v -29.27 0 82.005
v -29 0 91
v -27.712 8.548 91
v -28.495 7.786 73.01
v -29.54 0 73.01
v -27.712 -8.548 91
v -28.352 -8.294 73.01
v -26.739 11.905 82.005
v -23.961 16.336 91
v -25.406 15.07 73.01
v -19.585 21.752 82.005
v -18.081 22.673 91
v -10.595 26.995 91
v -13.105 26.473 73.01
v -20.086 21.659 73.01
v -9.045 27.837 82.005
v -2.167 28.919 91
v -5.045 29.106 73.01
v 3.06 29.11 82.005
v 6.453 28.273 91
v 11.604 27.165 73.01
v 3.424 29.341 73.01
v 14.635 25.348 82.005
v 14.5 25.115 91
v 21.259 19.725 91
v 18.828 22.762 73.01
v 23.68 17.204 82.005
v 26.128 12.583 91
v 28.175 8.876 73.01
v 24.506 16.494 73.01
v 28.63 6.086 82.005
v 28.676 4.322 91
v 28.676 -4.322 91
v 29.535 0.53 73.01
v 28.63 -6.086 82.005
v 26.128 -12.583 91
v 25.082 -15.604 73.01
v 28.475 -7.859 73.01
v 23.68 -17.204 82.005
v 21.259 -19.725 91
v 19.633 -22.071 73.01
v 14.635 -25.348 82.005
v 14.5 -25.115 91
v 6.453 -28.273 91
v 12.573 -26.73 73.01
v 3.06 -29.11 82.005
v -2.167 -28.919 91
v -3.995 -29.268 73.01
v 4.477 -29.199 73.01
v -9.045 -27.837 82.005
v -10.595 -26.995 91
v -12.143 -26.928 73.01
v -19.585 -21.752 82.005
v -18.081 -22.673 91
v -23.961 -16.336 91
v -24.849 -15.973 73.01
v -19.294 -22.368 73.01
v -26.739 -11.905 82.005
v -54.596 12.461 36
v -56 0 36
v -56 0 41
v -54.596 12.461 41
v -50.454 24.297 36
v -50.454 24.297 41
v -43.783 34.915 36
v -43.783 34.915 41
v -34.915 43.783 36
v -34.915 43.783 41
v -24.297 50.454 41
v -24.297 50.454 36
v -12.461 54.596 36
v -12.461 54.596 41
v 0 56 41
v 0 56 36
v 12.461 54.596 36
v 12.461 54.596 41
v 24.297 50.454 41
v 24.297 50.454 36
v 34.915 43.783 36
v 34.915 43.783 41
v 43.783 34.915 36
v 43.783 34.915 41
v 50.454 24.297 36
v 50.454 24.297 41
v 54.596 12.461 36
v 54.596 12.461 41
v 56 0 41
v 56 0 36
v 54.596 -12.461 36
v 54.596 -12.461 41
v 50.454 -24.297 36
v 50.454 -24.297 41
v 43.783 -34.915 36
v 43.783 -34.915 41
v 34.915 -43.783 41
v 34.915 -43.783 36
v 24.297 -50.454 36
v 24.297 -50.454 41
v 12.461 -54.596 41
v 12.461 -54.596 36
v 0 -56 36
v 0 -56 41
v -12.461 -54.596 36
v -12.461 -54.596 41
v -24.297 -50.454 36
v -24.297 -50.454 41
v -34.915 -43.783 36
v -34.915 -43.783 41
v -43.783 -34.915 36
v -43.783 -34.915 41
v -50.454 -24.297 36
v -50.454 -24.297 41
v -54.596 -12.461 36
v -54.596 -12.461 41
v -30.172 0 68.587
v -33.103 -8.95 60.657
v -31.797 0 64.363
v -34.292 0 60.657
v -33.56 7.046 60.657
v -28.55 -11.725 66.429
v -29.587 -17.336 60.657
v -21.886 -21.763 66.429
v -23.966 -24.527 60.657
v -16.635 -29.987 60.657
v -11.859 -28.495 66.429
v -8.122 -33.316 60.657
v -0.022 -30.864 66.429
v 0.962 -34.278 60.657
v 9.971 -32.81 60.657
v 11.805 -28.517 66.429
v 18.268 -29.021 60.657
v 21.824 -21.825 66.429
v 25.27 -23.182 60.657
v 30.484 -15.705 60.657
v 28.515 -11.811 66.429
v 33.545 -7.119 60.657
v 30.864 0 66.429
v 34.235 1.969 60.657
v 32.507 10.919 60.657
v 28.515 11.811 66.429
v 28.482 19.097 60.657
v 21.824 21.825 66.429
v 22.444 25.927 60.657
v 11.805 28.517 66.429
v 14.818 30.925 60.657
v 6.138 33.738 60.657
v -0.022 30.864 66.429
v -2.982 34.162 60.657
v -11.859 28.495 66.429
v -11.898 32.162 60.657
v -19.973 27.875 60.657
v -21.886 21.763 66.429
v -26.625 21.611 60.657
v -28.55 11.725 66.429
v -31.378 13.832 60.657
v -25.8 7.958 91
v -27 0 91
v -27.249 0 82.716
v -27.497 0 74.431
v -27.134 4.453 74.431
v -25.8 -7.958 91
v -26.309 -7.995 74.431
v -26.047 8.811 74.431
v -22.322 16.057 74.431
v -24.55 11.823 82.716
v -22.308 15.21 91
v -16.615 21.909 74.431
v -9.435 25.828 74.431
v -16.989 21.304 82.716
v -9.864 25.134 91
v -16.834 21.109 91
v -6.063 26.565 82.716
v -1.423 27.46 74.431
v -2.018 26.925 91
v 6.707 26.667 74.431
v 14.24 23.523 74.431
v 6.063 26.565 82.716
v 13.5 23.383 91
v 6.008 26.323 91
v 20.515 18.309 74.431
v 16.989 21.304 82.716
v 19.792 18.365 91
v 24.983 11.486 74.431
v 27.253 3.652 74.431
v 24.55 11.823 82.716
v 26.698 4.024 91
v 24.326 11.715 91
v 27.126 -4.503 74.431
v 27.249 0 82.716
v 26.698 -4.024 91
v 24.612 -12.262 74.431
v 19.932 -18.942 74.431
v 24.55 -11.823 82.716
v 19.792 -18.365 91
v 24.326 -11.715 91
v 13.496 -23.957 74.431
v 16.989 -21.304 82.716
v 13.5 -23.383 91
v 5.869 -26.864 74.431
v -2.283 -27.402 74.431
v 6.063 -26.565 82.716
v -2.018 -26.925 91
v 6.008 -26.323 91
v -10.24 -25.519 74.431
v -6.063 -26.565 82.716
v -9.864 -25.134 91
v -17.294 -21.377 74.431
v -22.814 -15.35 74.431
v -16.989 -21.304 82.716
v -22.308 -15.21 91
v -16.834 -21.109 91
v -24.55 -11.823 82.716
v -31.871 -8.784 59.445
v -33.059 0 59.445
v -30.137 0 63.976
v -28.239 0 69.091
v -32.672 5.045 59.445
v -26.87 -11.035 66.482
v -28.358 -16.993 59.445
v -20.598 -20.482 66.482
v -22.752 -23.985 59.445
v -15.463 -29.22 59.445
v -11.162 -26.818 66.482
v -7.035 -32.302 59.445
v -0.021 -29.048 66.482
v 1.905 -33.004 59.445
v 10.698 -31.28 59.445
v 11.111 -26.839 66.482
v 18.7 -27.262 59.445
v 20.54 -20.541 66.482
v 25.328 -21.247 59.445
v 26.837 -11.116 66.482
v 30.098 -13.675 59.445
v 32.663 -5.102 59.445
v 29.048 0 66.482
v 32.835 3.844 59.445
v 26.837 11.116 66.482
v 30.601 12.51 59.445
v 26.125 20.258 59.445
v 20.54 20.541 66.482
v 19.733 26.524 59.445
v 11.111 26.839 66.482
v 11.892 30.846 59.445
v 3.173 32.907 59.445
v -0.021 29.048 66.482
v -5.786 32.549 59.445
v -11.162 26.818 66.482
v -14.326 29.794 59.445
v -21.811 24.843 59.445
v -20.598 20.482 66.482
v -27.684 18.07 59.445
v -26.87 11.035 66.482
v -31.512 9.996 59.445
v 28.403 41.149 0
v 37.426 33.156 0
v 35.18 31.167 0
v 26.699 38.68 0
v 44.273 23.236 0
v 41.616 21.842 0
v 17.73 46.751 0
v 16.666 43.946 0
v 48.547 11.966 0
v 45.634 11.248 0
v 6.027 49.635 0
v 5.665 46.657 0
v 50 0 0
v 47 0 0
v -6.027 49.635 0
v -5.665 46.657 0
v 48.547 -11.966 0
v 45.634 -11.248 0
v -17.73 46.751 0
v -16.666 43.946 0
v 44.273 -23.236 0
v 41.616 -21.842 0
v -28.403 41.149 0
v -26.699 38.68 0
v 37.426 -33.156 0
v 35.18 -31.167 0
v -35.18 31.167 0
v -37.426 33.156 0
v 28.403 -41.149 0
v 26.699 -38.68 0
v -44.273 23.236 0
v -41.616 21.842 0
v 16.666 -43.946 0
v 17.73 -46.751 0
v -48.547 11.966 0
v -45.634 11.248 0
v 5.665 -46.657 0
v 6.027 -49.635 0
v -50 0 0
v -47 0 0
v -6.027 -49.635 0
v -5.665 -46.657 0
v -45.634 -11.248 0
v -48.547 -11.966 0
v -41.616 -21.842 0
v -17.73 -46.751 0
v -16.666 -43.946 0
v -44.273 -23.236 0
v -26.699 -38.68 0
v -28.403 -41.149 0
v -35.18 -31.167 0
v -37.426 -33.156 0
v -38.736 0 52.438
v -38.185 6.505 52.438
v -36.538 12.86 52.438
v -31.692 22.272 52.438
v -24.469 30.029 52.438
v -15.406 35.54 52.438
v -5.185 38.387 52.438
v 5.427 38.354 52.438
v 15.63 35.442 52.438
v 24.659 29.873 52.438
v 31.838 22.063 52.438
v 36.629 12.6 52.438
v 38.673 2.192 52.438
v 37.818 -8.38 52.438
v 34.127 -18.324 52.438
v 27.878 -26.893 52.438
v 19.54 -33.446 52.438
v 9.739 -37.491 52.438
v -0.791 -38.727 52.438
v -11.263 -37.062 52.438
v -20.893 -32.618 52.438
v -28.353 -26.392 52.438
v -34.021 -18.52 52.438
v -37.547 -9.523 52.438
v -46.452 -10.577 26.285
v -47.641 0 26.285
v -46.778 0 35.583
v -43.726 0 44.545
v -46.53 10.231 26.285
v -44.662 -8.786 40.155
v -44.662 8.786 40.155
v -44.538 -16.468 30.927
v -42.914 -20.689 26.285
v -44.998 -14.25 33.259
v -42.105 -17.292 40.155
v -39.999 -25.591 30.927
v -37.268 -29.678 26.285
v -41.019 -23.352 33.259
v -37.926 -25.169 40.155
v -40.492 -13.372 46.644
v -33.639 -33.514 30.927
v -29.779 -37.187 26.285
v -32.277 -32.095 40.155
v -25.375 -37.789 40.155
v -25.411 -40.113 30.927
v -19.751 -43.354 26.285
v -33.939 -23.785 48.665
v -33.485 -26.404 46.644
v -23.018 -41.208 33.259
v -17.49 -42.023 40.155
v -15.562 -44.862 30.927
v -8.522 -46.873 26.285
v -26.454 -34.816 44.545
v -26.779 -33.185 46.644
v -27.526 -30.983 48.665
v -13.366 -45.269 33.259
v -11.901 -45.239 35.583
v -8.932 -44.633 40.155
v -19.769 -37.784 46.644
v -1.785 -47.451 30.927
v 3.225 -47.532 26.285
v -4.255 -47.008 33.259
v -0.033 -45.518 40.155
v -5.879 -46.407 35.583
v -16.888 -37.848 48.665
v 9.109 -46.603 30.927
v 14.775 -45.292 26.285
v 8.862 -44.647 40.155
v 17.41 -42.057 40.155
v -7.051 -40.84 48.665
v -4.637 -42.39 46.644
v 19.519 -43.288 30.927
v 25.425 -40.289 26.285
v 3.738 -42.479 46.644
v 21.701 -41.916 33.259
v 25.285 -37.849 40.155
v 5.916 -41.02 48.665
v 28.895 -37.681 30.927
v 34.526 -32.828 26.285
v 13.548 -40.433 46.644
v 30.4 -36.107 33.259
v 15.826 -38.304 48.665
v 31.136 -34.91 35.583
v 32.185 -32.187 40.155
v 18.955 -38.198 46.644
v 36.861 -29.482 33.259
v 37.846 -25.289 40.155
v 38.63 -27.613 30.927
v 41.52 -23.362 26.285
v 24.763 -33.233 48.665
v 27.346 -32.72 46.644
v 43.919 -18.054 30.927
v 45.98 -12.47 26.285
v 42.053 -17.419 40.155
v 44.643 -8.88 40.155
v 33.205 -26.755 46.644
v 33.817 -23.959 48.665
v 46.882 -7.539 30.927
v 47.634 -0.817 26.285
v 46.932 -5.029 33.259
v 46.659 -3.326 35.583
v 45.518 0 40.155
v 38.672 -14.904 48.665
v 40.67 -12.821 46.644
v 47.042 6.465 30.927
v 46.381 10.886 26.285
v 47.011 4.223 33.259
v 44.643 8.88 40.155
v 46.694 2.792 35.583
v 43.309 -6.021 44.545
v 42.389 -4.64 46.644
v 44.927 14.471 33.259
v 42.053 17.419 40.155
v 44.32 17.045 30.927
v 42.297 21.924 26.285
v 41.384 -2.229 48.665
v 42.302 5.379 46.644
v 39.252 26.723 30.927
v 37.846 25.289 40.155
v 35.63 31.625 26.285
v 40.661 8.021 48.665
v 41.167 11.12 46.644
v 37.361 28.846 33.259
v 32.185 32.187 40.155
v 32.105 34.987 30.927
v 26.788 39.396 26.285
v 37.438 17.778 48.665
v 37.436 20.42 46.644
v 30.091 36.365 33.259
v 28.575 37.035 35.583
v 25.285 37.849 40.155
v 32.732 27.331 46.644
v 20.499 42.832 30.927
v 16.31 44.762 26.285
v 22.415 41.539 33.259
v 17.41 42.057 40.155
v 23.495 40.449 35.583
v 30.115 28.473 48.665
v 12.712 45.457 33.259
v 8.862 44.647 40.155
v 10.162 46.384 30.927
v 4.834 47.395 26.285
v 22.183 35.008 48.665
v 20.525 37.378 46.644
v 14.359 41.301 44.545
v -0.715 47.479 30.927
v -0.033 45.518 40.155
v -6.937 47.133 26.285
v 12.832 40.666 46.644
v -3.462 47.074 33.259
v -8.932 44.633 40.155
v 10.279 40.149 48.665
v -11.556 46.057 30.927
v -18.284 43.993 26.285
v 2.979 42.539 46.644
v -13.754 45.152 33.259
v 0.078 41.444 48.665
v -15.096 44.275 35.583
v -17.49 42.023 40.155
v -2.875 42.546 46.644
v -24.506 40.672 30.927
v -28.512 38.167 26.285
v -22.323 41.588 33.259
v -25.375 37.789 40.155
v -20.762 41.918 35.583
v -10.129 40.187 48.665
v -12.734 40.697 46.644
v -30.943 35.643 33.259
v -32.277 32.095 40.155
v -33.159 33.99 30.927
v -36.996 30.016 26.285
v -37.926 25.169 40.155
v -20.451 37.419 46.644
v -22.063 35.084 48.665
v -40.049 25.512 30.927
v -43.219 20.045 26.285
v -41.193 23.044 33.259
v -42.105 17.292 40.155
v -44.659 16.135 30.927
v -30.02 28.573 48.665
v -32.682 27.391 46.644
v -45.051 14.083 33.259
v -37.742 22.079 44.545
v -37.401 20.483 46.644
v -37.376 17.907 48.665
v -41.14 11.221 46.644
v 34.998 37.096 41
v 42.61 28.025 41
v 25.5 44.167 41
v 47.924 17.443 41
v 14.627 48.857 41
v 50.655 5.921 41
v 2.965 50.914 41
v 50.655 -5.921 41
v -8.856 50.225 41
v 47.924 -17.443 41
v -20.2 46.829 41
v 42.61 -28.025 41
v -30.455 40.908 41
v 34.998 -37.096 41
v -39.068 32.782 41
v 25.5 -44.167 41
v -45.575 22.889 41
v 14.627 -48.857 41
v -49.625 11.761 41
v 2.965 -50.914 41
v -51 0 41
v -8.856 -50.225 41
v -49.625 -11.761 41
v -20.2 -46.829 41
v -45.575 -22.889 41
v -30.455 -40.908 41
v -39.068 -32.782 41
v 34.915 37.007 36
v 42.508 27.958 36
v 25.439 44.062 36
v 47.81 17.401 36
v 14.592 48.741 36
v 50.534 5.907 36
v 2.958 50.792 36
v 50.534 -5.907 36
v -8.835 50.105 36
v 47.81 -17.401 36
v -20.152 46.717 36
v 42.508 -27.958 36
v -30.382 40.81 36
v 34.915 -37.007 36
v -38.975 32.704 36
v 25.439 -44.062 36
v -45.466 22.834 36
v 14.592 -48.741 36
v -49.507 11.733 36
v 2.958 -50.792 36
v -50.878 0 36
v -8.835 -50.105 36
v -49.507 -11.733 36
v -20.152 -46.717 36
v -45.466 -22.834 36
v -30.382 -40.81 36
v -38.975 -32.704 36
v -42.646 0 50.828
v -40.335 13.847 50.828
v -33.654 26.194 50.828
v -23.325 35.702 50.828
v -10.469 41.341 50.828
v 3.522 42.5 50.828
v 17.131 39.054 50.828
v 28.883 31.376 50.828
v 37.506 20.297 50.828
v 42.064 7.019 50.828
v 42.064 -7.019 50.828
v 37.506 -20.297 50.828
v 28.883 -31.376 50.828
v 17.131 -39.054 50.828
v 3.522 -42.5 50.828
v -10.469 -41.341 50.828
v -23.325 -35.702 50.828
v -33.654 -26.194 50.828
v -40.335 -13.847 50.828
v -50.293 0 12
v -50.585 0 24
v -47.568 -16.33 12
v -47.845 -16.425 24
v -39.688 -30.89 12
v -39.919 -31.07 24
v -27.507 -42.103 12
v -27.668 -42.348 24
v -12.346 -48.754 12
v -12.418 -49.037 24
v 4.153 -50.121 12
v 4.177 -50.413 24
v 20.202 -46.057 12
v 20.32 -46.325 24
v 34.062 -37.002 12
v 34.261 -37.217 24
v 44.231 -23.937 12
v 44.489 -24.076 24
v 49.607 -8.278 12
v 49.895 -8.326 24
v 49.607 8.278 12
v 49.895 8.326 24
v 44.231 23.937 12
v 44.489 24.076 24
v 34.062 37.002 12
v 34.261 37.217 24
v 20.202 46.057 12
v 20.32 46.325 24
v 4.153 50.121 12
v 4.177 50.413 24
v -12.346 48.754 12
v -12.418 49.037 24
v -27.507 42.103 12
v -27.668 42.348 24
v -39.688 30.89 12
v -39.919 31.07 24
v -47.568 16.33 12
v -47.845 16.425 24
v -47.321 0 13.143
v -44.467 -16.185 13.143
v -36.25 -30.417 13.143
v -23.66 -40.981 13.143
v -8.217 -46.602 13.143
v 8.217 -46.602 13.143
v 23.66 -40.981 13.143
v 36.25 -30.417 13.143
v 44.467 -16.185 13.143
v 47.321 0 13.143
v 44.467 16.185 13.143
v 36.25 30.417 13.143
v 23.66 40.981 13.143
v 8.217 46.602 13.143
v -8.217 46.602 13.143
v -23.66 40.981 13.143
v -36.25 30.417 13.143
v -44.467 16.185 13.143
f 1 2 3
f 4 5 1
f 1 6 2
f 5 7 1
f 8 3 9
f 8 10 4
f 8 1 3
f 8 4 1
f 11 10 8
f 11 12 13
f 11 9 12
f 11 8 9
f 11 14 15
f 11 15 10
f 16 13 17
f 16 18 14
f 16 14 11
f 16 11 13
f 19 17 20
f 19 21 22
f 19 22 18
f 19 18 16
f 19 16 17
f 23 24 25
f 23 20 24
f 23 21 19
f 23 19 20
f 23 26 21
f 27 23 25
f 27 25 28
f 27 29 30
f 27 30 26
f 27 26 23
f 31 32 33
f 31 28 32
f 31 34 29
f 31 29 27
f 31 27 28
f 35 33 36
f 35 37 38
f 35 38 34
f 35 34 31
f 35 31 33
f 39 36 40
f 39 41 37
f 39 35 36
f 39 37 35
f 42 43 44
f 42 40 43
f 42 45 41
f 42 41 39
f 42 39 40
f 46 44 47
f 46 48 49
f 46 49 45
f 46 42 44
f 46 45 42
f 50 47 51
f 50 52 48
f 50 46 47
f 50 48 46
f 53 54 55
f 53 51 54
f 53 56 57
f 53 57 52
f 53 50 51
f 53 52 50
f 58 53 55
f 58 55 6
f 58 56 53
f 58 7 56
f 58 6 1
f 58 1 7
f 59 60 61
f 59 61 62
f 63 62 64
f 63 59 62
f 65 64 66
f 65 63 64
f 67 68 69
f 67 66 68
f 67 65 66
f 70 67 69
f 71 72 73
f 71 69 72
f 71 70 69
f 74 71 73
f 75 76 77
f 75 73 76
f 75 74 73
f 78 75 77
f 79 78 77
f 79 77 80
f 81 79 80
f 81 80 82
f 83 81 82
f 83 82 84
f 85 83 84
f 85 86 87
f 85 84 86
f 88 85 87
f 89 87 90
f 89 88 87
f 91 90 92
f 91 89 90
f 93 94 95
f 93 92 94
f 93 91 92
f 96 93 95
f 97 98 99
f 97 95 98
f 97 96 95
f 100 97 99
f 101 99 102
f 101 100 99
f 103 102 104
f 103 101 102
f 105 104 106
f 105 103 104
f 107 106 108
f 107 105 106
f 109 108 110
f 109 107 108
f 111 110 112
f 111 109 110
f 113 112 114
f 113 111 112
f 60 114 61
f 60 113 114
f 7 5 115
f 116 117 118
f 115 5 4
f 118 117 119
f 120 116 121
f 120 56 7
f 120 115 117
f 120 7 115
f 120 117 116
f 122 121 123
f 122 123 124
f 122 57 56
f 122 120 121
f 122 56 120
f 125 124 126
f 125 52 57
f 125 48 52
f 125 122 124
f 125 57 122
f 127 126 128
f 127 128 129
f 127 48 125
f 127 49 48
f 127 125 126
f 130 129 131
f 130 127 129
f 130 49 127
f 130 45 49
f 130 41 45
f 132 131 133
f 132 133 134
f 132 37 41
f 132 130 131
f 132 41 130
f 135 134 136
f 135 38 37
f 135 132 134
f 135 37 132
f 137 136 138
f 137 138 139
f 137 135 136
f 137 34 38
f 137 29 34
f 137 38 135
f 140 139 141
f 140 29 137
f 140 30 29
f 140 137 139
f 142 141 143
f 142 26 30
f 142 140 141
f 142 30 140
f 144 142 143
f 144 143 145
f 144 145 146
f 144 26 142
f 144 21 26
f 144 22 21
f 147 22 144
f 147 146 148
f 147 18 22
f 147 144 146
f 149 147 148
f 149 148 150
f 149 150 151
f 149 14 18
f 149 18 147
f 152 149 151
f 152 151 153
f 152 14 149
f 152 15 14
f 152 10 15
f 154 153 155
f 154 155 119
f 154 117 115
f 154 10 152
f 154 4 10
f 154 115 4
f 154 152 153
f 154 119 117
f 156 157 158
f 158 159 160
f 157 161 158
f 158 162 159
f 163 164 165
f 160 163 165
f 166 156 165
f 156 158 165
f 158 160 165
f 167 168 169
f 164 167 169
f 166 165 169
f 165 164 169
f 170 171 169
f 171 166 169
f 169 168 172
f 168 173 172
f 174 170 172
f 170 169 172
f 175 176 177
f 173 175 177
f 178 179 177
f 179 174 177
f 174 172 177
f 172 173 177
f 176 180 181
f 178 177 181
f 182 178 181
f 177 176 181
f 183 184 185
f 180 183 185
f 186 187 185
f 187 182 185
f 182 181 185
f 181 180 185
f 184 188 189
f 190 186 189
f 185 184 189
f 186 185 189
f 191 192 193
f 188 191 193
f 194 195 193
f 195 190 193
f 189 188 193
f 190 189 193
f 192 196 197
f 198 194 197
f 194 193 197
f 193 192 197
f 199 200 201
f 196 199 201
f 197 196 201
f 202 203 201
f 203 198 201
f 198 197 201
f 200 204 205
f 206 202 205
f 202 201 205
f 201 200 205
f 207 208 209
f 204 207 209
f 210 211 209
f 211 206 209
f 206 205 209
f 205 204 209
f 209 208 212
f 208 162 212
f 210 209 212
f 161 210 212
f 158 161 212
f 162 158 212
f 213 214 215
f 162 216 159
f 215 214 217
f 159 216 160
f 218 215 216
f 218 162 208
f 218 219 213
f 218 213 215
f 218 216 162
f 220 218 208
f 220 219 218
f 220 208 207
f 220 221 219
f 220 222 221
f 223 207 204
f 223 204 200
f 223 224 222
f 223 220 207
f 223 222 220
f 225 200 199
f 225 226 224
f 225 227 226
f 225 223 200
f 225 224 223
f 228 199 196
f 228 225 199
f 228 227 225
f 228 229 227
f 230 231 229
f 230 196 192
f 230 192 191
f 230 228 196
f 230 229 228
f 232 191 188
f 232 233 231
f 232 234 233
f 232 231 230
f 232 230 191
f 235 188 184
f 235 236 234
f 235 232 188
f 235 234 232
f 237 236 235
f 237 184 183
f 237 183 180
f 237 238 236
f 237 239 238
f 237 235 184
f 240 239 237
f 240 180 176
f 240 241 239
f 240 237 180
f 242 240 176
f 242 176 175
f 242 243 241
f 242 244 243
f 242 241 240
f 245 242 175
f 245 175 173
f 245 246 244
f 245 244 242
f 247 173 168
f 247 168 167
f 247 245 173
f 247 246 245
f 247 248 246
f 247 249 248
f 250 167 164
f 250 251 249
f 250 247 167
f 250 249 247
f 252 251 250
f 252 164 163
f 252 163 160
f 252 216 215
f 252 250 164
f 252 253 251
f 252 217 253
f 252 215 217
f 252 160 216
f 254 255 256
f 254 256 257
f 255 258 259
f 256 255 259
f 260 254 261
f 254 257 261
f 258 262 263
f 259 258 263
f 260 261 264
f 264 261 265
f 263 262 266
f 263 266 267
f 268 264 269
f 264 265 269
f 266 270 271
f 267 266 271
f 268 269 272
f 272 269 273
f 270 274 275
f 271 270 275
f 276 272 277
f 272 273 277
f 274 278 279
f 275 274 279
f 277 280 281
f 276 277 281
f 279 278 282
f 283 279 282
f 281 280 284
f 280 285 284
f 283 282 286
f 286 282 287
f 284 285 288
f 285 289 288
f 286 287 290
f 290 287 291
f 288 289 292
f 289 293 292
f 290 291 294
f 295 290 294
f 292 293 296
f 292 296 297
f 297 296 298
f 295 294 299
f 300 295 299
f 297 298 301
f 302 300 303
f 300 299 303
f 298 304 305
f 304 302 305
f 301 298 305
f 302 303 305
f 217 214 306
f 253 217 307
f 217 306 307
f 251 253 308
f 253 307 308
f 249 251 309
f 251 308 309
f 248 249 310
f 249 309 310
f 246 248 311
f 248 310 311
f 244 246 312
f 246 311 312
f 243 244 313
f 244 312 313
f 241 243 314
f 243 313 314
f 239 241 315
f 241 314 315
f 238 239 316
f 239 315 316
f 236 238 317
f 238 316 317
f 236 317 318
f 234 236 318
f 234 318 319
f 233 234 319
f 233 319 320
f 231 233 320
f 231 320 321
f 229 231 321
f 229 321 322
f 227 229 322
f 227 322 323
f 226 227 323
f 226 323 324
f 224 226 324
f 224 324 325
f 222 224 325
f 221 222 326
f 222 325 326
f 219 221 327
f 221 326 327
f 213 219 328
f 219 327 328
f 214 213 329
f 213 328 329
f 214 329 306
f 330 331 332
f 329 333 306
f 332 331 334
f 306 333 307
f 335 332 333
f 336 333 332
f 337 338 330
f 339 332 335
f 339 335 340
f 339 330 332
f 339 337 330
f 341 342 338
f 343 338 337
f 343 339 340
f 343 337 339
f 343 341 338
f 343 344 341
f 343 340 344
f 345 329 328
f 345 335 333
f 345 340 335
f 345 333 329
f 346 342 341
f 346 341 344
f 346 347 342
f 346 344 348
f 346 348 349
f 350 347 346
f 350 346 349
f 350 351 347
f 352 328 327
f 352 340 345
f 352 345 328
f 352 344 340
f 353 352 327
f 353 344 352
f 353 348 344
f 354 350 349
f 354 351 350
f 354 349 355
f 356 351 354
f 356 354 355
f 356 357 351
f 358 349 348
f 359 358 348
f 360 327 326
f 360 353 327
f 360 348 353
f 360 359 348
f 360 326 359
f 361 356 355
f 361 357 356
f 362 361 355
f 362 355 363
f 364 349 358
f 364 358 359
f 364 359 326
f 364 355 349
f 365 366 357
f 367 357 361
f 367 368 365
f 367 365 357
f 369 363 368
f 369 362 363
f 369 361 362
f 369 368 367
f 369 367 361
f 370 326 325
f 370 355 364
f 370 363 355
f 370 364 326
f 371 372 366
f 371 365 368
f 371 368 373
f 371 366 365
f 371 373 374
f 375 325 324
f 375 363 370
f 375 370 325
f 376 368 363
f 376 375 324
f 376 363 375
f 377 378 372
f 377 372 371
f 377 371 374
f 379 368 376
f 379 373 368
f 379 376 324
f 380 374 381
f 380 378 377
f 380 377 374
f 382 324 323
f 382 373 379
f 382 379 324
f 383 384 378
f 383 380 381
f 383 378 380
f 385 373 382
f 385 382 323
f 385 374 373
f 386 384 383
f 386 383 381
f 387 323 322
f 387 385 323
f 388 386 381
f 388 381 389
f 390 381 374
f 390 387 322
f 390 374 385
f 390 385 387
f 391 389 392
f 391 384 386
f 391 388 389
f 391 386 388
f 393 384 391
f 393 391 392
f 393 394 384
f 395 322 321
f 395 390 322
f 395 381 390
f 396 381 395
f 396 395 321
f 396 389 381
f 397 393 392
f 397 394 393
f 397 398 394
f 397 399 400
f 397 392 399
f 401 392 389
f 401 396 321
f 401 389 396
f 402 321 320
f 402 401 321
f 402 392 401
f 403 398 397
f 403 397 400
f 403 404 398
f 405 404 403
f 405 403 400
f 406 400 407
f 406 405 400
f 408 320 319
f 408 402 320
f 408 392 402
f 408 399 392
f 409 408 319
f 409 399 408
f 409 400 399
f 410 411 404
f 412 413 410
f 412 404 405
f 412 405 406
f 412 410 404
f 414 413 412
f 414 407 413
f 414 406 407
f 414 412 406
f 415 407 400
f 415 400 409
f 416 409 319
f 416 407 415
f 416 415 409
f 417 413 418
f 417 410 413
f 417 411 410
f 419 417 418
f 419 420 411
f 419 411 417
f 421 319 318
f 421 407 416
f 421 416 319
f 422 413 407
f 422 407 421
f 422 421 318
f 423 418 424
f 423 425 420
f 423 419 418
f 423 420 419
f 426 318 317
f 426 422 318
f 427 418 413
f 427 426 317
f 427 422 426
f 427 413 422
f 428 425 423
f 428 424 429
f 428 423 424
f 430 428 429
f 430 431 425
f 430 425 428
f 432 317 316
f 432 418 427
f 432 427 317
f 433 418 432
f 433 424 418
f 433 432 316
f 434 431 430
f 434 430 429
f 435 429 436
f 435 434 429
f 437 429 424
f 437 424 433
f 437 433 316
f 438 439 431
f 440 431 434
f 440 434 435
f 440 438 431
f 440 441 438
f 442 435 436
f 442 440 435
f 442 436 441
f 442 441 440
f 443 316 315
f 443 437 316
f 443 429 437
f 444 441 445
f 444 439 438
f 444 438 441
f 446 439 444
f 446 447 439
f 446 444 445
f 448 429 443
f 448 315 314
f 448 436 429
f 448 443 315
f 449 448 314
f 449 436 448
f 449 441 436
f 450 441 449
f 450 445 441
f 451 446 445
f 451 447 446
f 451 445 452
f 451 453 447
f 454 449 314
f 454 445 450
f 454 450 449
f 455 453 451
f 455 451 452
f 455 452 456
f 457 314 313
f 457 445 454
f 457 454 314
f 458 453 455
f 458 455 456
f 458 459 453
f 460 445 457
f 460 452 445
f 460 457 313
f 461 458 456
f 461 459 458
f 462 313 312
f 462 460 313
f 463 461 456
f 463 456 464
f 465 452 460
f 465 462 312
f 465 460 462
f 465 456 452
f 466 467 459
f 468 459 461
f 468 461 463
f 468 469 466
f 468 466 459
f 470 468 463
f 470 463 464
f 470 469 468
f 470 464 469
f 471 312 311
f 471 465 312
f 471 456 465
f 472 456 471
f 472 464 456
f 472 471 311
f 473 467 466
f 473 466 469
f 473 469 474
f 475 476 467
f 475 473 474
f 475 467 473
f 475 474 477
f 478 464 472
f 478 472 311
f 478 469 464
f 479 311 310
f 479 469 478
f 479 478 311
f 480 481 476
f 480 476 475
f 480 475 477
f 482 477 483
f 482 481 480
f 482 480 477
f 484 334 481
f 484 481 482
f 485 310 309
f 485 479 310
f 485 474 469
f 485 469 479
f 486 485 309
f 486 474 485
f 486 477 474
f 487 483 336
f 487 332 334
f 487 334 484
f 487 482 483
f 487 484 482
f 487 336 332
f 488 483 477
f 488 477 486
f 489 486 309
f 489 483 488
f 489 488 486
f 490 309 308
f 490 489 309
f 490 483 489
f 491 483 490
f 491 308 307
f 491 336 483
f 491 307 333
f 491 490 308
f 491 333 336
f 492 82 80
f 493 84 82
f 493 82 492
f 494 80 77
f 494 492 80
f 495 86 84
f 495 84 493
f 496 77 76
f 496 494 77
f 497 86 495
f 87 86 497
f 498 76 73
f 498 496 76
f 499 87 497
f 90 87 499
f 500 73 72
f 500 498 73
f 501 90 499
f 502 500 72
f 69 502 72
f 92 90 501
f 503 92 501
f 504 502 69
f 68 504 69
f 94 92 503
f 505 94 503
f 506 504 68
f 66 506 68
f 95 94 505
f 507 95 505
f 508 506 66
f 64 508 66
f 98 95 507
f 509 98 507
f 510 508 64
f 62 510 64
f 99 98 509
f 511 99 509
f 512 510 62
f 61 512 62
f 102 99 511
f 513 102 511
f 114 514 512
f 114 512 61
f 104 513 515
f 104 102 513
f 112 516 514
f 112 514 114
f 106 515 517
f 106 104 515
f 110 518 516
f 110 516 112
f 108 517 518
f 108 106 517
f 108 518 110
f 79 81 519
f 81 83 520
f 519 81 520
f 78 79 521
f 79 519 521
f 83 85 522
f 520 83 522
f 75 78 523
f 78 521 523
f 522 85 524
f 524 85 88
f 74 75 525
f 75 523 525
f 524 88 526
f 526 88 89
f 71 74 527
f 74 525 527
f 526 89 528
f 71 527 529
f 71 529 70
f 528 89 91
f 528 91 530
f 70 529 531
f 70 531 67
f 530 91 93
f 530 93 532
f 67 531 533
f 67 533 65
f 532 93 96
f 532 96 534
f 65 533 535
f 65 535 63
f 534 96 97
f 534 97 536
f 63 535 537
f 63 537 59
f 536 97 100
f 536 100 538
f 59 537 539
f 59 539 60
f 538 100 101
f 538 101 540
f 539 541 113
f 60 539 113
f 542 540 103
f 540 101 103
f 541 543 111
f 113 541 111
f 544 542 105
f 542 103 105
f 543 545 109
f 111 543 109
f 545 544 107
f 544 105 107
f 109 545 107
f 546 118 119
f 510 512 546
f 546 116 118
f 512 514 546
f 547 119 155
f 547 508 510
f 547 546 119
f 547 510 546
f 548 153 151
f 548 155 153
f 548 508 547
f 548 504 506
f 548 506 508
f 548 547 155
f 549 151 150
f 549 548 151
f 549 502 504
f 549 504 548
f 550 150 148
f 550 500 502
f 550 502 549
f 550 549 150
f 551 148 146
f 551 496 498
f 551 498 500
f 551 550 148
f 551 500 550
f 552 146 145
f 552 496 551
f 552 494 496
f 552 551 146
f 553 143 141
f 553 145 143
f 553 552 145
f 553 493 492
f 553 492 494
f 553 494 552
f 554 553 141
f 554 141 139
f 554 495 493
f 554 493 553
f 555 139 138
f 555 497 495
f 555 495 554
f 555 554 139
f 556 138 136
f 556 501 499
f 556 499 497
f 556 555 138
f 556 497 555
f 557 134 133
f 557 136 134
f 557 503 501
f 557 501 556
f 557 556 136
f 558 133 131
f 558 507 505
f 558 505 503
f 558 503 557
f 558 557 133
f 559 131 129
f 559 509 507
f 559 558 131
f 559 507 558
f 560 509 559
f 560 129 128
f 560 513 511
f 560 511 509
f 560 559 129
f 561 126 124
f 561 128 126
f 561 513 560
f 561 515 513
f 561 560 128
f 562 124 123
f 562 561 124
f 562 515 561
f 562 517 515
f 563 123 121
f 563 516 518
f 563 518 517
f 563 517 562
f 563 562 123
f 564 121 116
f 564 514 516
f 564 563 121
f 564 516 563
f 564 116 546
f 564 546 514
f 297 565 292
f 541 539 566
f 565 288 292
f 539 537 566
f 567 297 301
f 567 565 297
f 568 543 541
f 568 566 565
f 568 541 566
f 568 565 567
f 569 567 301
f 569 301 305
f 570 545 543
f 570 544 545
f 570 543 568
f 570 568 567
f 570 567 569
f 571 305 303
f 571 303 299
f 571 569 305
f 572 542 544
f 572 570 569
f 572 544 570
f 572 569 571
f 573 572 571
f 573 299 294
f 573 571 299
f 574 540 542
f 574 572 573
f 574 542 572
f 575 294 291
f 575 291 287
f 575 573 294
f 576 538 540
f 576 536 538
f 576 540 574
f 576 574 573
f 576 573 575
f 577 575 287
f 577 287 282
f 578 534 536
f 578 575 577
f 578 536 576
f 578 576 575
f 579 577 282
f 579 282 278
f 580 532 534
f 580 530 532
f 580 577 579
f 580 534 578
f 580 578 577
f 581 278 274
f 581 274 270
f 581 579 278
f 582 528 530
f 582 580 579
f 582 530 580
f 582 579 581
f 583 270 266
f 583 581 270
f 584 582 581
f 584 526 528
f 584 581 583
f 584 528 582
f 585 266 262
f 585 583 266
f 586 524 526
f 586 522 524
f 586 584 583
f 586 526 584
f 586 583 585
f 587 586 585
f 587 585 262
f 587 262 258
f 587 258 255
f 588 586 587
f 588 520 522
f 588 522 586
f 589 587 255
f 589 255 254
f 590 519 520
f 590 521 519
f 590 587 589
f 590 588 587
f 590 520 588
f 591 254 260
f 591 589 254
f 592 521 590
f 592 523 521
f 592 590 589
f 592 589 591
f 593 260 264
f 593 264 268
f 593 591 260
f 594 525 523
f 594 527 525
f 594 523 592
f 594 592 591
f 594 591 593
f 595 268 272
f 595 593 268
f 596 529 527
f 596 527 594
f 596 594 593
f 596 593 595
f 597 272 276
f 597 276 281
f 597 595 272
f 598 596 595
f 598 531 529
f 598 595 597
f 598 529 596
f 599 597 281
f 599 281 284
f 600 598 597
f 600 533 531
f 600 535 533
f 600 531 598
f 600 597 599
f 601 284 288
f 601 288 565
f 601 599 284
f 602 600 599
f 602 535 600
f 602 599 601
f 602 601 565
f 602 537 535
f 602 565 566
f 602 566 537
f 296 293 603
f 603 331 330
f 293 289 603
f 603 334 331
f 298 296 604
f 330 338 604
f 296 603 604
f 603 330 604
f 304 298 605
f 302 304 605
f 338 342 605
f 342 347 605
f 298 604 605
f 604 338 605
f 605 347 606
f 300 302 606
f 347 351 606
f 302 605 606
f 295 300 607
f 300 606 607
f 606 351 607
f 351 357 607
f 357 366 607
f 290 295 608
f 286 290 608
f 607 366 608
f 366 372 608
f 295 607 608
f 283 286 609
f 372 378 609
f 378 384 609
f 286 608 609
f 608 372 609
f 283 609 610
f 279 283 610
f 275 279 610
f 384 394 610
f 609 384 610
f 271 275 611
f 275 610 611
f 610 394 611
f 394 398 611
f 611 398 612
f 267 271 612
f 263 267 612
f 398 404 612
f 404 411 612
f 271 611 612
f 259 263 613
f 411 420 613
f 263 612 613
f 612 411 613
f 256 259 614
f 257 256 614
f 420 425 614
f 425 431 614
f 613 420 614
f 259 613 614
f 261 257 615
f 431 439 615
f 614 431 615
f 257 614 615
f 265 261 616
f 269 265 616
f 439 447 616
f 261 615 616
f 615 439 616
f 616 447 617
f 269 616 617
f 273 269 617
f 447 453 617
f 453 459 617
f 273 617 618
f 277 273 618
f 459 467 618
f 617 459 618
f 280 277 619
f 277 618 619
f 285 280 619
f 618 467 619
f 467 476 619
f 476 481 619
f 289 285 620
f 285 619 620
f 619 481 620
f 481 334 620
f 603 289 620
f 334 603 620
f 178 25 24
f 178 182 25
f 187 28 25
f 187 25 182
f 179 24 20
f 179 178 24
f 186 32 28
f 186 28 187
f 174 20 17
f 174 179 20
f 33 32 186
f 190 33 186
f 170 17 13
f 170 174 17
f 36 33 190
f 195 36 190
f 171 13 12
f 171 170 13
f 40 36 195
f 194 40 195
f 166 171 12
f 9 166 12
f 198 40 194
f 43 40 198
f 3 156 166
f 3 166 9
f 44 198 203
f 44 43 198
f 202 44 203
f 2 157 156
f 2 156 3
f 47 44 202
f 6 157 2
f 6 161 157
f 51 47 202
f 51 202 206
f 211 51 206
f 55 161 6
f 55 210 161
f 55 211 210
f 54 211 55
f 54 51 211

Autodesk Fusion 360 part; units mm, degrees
sketch "Sketch1" plane through (0, 0, 0) normal (0, 0, 1) x (1, 0, 0)
  circle A0 centre (0, 0) radius 50
  circle A1 centre (0, 0) radius 47
  dimension "d1" = 100
  dimension "d9" = -3
ref_plane "WorkPlane1" through (0, 0, 41) normal (0, 0, 1) x (1, 0, 0)
sketch "Sketch2" plane through (0, 0, 41) normal (0, 0, 1) x (1, 0, 0)
  circle A0 centre (0, 0) radius 51
  circle A1 centre (0, 0) radius 48
  dimension "d4" = 102
  dimension "d10" = -3
ref_plane "WorkPlane2" through (0, 0, 66) normal (0, 0, 1) x (1, 0, 0)
sketch "Sketch5" plane through (0, 0, 66) normal (0, 0, 1) x (1, 0, 0)
  circle A0 centre (0, 0) radius 29.75
  circle A1 centre (0, 0) radius 27.75
  dimension "d22" = 59.5
  dimension "d23" = -2
ref_plane "WorkPlane3" through (0, 0, 91) normal (0, 0, 1) x (1, 0, 0)
sketch "Sketch6" plane through (0, 0, 91) normal (0, 0, 1) x (1, 0, 0)
  circle A0 centre (0, 0) radius 29
  circle A1 centre (0, 0) radius 27
  dimension "d25" = 58
  dimension "d26" = -2
sketch "Sketch7" plane through (0, 0, 0) normal (0, 1, 0) x (1, 0, 0)
  line L0 (-47, 0) -> (47, 0)
  line L1 (-50, 0) -> (50, 0)
  line L2 (-51, -41) -> (51, -41)
  line L3 (-48, -41) -> (48, -41)
  line L4 (-27.75, -66) -> (27.75, -66)
  line L5 (-29.75, -66) -> (29.75, -66)
  line L6 (-27, -91) -> (27, -91)
  line L7 (-29, -91) -> (29, -91)
  line L8 (-50, 0) -> (-51, -41)
  line L9 (-47, 0) -> (-48, -41)
  line L10 (-48, -41) -> (-27.75, -66)
  line L11 (-51, -41) -> (-29.75, -66)
  line L12 (-29.75, -66) -> (-29, -91)
  line L13 (-27.75, -66) -> (-27, -91)
  line L14 (-51, -41) -> (-56, -41)
  line L15 (-56, -41) -> (-56, -36)
  line L16 (-56, -36) -> (-51, -36)
  line L17 (-51, -36) -> (-51, -41) construction
  line L18 (-51, -36) -> (-50.878, -36)
  line L19 (0, 0) -> (0, -91) construction
  dimension "d27" = 5
  dimension "d28" = 5
revolve "Revolve2" add sketch "Sketch7" angle 360 about axis through (0, 0, 0) along (0, 0, 1)
fillet "Fillet4" radius 40 1 edges at (-44.7517, 17.3575, 41)
fillet "Fillet5" radius 25 1 edges at (-25.8721, 10.0348, 66)
fillet "Fillet6" radius 20 1 edges at (-27.7367, 10.7581, 66)
